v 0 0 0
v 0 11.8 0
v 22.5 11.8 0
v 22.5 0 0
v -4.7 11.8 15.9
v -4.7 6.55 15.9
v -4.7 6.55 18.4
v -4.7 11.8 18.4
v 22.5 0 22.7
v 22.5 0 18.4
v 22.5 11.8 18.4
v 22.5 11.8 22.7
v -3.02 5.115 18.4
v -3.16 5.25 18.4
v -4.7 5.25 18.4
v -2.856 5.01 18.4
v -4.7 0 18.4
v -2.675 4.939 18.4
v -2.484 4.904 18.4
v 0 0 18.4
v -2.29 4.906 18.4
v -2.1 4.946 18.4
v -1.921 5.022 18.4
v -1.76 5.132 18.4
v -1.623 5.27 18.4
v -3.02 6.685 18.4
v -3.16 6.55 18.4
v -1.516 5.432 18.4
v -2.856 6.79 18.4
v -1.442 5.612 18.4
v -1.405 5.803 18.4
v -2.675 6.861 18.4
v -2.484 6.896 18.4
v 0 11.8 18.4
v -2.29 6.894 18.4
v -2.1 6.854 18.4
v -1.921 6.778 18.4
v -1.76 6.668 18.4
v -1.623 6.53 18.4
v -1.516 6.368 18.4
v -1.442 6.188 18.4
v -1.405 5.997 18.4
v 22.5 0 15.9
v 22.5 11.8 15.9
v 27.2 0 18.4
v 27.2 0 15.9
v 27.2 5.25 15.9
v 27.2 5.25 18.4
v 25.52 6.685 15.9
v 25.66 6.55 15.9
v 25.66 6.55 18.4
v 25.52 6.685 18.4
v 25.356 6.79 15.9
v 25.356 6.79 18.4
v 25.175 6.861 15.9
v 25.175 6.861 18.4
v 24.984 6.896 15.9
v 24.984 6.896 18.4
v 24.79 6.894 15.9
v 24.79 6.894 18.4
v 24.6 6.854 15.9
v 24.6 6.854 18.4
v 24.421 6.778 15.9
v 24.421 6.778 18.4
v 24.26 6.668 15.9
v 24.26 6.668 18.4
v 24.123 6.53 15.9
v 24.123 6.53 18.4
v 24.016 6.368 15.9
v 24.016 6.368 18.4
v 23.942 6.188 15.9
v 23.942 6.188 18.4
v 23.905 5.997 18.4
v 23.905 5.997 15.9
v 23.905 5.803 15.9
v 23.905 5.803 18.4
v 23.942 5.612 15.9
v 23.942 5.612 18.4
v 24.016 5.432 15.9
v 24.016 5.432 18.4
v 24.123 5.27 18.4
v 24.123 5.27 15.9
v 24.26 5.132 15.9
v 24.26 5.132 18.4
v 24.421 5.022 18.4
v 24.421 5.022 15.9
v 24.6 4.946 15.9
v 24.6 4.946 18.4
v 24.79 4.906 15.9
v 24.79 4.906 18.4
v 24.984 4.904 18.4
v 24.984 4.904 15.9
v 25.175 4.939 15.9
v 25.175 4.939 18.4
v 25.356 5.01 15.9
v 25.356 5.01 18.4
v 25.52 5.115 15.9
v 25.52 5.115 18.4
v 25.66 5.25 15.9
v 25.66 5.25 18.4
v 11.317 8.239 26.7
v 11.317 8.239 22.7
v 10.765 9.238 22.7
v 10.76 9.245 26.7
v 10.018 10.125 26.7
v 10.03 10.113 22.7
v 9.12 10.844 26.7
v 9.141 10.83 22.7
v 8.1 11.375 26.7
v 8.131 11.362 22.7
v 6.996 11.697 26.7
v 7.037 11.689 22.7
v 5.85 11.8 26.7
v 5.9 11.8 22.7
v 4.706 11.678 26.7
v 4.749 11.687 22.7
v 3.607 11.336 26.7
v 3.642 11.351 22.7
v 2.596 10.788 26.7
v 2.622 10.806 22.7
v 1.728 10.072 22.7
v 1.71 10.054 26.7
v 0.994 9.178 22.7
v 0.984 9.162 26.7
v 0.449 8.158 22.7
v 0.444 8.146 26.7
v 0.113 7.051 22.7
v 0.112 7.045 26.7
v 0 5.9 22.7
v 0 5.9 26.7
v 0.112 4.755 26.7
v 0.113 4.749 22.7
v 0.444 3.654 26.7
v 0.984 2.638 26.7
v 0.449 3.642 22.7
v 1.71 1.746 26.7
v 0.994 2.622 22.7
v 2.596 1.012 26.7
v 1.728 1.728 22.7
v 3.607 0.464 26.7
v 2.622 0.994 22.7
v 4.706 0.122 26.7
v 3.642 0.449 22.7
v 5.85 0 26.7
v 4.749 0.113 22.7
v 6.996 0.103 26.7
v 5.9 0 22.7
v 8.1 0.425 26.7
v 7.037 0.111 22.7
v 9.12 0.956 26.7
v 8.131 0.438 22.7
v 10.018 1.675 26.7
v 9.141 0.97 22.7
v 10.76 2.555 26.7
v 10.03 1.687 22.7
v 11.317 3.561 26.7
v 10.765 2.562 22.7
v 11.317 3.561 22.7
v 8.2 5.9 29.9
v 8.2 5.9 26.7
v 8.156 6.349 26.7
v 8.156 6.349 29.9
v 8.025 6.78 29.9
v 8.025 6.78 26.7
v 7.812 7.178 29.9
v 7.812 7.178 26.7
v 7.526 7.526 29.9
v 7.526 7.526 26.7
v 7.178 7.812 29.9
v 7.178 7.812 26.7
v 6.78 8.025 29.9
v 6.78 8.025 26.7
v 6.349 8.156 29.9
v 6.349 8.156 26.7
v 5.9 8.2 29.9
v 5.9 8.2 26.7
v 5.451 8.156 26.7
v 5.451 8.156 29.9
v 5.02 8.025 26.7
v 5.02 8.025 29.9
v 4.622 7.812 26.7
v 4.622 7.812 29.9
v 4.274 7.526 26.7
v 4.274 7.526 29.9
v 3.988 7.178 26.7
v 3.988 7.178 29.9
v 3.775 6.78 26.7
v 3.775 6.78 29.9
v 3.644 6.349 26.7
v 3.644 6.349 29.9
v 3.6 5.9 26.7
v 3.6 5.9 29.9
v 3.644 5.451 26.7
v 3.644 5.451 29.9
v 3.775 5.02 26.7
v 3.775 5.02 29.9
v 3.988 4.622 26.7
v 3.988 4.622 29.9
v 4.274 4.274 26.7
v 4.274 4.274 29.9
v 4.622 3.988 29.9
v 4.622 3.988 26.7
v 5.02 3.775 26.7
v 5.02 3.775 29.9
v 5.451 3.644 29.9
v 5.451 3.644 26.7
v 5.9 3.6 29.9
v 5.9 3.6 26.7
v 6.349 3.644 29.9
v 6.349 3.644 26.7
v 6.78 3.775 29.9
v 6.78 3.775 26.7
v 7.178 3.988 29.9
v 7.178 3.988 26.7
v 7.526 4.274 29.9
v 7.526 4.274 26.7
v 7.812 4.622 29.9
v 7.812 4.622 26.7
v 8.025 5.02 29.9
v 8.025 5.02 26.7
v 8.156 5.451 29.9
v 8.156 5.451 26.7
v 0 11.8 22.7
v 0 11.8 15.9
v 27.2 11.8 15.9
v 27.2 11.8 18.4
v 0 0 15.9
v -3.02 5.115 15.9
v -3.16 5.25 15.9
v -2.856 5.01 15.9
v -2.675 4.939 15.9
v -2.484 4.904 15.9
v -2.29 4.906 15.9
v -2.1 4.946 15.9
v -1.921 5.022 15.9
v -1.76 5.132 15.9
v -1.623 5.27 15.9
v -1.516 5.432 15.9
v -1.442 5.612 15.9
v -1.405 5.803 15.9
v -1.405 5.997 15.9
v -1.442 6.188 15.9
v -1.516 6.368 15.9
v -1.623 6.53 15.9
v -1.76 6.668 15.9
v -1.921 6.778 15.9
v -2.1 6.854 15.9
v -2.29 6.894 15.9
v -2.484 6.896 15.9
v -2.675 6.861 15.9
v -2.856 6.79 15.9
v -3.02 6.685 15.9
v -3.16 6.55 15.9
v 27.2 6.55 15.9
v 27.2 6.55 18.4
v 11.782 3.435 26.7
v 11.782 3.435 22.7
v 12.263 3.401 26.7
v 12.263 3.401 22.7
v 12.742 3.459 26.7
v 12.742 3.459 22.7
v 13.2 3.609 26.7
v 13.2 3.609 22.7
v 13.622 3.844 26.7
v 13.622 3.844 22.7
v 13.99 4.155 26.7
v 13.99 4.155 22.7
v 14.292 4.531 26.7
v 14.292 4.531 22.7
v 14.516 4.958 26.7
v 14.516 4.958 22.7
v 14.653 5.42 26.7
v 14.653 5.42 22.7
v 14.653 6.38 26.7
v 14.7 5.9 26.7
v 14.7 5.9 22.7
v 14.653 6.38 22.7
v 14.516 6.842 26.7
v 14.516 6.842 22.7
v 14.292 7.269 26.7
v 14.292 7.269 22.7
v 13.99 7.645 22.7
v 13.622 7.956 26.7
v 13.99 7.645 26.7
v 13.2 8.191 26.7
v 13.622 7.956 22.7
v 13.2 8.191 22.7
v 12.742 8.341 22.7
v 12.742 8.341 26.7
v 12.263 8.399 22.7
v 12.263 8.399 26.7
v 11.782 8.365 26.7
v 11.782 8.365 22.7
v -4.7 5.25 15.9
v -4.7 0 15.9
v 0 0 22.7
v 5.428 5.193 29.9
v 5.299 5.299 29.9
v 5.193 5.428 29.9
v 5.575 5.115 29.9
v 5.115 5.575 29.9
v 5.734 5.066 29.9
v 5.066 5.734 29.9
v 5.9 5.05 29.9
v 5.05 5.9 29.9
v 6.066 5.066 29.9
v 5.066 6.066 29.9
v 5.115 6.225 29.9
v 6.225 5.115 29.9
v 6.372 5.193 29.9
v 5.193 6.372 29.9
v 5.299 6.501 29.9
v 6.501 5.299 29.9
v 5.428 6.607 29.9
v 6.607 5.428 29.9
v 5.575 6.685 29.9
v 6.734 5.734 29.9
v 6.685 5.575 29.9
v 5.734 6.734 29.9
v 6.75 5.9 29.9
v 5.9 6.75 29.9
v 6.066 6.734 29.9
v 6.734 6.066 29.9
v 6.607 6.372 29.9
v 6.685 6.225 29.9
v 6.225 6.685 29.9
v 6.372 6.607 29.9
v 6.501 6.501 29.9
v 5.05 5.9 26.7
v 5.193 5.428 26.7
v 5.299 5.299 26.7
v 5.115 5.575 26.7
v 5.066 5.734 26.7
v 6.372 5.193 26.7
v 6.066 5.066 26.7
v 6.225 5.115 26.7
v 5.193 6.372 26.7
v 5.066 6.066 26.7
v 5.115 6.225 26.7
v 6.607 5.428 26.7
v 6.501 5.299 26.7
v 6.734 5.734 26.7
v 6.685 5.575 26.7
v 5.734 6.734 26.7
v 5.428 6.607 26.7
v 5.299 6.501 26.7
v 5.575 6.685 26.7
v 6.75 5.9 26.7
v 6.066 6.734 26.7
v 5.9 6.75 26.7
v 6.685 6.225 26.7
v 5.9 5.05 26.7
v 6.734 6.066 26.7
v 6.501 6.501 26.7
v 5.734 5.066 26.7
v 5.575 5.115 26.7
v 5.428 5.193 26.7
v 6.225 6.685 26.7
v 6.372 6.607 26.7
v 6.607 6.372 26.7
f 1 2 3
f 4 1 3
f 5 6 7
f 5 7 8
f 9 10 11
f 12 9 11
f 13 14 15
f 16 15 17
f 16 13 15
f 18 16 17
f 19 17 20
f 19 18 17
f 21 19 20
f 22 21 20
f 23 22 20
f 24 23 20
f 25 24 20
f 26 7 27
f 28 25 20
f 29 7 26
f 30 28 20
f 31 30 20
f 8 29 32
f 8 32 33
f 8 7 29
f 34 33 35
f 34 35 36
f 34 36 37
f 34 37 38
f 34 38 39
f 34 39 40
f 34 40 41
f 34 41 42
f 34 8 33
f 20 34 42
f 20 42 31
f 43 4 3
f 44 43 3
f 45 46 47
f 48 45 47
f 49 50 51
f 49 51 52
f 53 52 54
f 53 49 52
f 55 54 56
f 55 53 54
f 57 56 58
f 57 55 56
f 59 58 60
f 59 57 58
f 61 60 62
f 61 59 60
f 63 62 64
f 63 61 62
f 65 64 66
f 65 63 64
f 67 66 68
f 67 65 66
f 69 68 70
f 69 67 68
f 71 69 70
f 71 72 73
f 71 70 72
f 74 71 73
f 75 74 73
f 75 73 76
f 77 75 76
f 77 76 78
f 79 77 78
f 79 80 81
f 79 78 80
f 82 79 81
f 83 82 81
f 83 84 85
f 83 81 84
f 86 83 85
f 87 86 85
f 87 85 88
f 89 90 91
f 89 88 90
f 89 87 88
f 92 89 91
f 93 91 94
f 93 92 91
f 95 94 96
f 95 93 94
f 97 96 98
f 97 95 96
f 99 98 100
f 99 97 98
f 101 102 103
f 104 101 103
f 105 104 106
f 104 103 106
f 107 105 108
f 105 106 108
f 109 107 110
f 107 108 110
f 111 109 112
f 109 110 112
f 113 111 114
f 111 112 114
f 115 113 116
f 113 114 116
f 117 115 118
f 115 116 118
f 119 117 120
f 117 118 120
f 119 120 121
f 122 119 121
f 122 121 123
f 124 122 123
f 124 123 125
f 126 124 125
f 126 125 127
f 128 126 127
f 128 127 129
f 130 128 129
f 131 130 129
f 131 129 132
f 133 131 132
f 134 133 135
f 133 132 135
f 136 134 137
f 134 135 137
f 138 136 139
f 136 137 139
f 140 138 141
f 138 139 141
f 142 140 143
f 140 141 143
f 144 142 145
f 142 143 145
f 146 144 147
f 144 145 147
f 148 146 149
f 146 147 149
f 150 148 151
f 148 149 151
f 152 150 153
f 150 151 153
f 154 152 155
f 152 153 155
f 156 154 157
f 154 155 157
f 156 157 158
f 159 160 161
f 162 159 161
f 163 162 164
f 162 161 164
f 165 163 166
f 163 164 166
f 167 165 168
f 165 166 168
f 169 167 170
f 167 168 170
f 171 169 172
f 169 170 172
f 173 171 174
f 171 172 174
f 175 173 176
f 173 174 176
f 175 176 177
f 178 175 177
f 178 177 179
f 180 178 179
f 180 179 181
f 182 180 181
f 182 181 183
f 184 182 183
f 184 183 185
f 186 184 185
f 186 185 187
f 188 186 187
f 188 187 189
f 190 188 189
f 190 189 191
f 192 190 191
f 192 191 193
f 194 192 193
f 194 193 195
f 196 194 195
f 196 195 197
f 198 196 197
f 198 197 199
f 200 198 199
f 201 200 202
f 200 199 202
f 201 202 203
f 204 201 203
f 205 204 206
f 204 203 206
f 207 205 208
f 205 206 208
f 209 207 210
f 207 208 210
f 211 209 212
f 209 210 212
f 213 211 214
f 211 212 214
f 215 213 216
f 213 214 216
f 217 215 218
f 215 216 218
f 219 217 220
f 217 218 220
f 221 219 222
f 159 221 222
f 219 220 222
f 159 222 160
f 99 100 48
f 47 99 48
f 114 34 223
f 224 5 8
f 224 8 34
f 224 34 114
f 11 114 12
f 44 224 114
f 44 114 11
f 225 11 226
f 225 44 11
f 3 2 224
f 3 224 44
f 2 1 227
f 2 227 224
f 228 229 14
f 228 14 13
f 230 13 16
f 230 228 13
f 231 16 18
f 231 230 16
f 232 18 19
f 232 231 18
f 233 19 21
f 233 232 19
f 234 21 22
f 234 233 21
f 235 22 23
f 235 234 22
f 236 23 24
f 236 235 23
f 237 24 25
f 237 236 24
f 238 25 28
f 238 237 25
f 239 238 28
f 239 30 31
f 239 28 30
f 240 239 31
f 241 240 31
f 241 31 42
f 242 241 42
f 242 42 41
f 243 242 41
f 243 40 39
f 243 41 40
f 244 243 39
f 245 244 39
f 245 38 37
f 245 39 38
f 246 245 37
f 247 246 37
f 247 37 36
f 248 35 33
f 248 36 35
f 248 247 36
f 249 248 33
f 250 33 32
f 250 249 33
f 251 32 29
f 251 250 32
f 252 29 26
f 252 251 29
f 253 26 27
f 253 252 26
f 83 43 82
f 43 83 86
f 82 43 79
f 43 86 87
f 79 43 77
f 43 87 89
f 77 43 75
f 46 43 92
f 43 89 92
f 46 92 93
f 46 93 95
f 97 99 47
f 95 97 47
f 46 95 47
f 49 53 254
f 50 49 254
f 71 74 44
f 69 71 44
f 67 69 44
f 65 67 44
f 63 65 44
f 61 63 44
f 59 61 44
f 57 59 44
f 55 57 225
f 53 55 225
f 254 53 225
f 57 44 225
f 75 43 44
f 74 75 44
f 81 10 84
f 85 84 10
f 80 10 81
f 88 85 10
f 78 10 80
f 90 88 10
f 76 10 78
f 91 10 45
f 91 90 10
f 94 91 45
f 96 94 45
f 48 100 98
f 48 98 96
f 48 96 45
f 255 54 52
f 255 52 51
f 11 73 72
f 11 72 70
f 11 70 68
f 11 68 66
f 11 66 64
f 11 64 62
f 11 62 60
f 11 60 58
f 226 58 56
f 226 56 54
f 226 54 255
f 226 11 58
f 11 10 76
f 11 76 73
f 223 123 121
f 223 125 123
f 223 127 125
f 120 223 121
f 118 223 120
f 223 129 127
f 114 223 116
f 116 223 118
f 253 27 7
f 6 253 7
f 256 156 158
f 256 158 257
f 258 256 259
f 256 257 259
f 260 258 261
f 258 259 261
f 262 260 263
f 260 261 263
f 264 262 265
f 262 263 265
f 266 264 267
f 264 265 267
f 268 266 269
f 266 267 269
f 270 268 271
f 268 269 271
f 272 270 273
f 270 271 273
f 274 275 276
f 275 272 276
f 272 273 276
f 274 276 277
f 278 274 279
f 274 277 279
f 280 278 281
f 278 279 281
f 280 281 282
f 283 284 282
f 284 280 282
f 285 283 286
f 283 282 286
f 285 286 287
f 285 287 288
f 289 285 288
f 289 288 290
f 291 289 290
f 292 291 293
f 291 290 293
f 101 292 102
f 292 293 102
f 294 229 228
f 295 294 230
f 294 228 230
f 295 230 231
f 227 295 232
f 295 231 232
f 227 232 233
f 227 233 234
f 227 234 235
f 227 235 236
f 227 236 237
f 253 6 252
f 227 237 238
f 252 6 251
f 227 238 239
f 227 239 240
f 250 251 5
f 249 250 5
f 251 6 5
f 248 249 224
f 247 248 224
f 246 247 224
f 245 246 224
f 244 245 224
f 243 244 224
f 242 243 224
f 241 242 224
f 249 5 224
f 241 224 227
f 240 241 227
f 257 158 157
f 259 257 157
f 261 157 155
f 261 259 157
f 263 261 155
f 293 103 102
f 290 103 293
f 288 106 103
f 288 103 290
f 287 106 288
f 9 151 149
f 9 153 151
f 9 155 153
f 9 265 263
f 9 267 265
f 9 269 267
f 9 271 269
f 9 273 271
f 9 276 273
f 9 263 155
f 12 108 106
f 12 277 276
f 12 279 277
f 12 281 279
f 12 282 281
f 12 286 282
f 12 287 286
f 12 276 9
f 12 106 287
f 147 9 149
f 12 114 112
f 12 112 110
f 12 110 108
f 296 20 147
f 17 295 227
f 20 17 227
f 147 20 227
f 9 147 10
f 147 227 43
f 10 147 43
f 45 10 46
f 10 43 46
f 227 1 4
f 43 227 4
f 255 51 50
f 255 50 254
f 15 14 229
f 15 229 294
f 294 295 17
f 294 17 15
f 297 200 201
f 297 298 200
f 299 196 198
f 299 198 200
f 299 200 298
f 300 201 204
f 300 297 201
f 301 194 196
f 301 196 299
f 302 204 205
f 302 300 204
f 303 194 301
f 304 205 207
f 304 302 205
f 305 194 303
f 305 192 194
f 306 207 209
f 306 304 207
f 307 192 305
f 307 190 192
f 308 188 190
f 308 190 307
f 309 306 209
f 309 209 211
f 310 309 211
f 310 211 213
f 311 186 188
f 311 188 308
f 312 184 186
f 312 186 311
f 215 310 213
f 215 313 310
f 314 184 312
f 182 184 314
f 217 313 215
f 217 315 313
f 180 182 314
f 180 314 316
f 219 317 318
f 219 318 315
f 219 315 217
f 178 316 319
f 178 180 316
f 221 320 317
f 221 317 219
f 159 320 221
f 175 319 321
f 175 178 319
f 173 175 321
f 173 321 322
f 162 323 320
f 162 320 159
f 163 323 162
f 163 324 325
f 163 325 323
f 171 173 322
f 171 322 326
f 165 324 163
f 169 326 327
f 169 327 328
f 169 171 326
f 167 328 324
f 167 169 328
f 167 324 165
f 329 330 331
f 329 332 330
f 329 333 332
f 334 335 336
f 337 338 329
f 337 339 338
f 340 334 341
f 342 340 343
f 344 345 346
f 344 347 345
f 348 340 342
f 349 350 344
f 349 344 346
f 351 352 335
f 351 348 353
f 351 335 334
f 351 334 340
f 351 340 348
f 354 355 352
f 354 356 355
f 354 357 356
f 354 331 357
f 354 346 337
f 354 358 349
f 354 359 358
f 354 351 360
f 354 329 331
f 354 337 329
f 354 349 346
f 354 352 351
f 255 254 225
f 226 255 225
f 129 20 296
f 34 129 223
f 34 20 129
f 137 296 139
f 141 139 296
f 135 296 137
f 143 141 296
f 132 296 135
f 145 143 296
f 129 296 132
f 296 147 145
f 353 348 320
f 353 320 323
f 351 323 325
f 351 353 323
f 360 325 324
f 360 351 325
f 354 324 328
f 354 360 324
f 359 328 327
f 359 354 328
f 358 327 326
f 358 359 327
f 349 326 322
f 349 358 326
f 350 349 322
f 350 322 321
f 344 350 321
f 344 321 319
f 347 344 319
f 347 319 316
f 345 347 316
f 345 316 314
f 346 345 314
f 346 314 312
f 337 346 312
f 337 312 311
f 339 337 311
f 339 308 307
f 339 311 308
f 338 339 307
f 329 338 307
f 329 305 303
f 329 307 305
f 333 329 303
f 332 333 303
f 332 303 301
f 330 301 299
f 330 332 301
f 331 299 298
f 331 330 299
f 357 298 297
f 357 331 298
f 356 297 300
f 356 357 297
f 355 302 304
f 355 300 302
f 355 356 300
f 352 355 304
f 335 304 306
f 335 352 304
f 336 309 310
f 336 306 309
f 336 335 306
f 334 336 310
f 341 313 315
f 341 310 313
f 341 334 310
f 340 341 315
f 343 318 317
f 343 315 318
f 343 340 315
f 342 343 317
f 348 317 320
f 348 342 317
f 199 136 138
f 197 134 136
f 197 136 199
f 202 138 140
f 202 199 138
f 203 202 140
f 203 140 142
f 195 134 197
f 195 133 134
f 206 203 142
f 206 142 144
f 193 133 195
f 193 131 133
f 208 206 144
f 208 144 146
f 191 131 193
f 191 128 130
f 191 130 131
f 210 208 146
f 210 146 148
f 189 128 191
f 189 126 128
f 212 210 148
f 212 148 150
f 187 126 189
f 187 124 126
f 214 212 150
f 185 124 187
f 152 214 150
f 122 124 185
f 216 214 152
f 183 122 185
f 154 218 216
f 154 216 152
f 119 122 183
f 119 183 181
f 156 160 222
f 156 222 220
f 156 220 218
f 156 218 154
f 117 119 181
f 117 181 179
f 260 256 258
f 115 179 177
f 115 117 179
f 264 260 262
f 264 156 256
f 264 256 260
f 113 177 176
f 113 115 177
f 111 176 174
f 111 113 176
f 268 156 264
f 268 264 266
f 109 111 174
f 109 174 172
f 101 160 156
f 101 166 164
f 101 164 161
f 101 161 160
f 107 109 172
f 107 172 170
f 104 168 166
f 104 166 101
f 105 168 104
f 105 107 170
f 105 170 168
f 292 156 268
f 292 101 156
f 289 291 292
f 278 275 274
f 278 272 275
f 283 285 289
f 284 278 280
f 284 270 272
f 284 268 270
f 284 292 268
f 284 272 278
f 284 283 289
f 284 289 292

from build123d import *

# Parameters (mm, degrees)
CYLINDER005_R             = 0.85
CYLINDER005_DEPTH         = 4
CYLINDER004_R             = 2.3
CYLINDER004_DEPTH         = 3.3
CYLINDER003_R             = 2.5
CYLINDER003_DEPTH         = 4
CYLINDER002_R             = 5.9
CYLINDER002_DEPTH         = 4
BOX003_W                  = 22.5
BOX003_H                  = 11.8
BOX003_DEPTH              = 22.7
BOX002_W                  = 4.3
BOX002_H                  = 1.3
BOX002_DEPTH              = 5
CYLINDER001_R             = 1
CYLINDER001_DEPTH         = 5
FUSION001_PLACEMENT_ANGLE = 180
BOX001_W                  = 4.3
BOX001_H                  = 1.3
BOX001_DEPTH              = 5
CYLINDER_R                = 1
CYLINDER_DEPTH            = 5
BOX_W                     = 31.9
BOX_H                     = 11.8
BOX_DEPTH                 = 2.5


with BuildPart() as cylinder005:
    # Cylinder005 → Cylinder005 (new body)
    with BuildSketch(Plane.XY.offset(-0.5)):
        Circle(CYLINDER005_R)
    extrude(amount=CYLINDER005_DEPTH)


with BuildPart() as rotor:
    # Cylinder004 → Cylinder004 (new body)
    with BuildSketch(Plane.XY.offset(-0.1)):
        Circle(CYLINDER004_R)
    extrude(amount=CYLINDER004_DEPTH)

    # Cut002: cut Cylinder005
    add(cylinder005.part, mode=Mode.SUBTRACT)


with BuildPart() as rotor_1:
    # Cut002 placement: moved
    add(rotor.part.moved(Location((5.9, 5.9, 26.7))))


with BuildPart() as cylinder003:
    # Cylinder003 → Cylinder003 (new body)
    with BuildSketch(Plane(origin=(6.3, 0, 0), x_dir=(1, 0, 0), z_dir=(0, 0, 1))):
        Circle(CYLINDER003_R)
    extrude(amount=CYLINDER003_DEPTH)


with BuildPart() as soporte_con_rotor:
    # Cylinder002 → Cylinder002 (new body)
    with BuildSketch(Plane.XY):
        Circle(CYLINDER002_R)
    extrude(amount=CYLINDER002_DEPTH)

    # Fusion002: union Cylinder003
    add(cylinder003.part)


with BuildPart() as soporte_con_rotor_1:
    # Fusion002 placement: moved
    add(soporte_con_rotor.part.moved(Location((5.9, 5.9, 22.7))))

    # Fusion004: union rotor
    add(rotor_1.part)


with BuildPart() as base:
    # Box003 → Box003 (new body)
    with BuildSketch(Plane.XY):
        with Locations((11.25, 5.9)):
            Rectangle(BOX003_W, BOX003_H)
    extrude(amount=BOX003_DEPTH)


with BuildPart() as taladro_cubo001:
    # Box002 → Box002 (new body)
    with BuildSketch(Plane(origin=(0, -0.65, 0), x_dir=(1, 0, 0), z_dir=(0, 0, 1))):
        with Locations((2.15, 0.65)):
            Rectangle(BOX002_W, BOX002_H)
    extrude(amount=BOX002_DEPTH)


with BuildPart() as fusion001:
    # Cylinder001 → Cylinder001 (new body)
    with BuildSketch(Plane.XY):
        Circle(CYLINDER001_R)
    extrude(amount=CYLINDER001_DEPTH)

    # Fusion001: union taladro-cubo001
    add(taladro_cubo001.part)


with BuildPart() as fusion001_1:
    # Fusion001 placement: moved
    add(fusion001.part.moved(Location((2.3, 5.9, -1))).rotate(Axis((2.3, 5.9, -1), (0, 0, 1)), FUSION001_PLACEMENT_ANGLE))


with BuildPart() as taladro_cubo:
    # Box001 → Box001 (new body)
    with BuildSketch(Plane(origin=(0, -0.65, 0), x_dir=(1, 0, 0), z_dir=(0, 0, 1))):
        with Locations((2.15, 0.65)):
            Rectangle(BOX001_W, BOX001_H)
    extrude(amount=BOX001_DEPTH)


with BuildPart() as fusion:
    # Cylinder → Cylinder (new body)
    with BuildSketch(Plane.XY):
        Circle(CYLINDER_R)
    extrude(amount=CYLINDER_DEPTH)

    # Fusion: union taladro-cubo
    add(taladro_cubo.part)


with BuildPart() as fusion_1:
    # Fusion placement: moved
    add(fusion.part.moved(Location((29.6, 5.9, -1))))


with BuildPart() as fusion005:
    # Box → Box (new body)
    with BuildSketch(Plane.XY):
        with Locations((15.95, 5.9)):
            Rectangle(BOX_W, BOX_H)
    extrude(amount=BOX_DEPTH)

    # Cut: cut Fusion
    add(fusion_1.part, mode=Mode.SUBTRACT)

    # Cut001: cut Fusion001
    add(fusion001_1.part, mode=Mode.SUBTRACT)


with BuildPart() as fusion005_1:
    # Cut001 placement: moved
    add(fusion005.part.moved(Location((-4.7, 0, 15.9))))

    # Fusion003: union base
    add(base.part)

    # Fusion005: union soporte-con-rotor
    add(soporte_con_rotor_1.part)


solid = fusion005_1.part
